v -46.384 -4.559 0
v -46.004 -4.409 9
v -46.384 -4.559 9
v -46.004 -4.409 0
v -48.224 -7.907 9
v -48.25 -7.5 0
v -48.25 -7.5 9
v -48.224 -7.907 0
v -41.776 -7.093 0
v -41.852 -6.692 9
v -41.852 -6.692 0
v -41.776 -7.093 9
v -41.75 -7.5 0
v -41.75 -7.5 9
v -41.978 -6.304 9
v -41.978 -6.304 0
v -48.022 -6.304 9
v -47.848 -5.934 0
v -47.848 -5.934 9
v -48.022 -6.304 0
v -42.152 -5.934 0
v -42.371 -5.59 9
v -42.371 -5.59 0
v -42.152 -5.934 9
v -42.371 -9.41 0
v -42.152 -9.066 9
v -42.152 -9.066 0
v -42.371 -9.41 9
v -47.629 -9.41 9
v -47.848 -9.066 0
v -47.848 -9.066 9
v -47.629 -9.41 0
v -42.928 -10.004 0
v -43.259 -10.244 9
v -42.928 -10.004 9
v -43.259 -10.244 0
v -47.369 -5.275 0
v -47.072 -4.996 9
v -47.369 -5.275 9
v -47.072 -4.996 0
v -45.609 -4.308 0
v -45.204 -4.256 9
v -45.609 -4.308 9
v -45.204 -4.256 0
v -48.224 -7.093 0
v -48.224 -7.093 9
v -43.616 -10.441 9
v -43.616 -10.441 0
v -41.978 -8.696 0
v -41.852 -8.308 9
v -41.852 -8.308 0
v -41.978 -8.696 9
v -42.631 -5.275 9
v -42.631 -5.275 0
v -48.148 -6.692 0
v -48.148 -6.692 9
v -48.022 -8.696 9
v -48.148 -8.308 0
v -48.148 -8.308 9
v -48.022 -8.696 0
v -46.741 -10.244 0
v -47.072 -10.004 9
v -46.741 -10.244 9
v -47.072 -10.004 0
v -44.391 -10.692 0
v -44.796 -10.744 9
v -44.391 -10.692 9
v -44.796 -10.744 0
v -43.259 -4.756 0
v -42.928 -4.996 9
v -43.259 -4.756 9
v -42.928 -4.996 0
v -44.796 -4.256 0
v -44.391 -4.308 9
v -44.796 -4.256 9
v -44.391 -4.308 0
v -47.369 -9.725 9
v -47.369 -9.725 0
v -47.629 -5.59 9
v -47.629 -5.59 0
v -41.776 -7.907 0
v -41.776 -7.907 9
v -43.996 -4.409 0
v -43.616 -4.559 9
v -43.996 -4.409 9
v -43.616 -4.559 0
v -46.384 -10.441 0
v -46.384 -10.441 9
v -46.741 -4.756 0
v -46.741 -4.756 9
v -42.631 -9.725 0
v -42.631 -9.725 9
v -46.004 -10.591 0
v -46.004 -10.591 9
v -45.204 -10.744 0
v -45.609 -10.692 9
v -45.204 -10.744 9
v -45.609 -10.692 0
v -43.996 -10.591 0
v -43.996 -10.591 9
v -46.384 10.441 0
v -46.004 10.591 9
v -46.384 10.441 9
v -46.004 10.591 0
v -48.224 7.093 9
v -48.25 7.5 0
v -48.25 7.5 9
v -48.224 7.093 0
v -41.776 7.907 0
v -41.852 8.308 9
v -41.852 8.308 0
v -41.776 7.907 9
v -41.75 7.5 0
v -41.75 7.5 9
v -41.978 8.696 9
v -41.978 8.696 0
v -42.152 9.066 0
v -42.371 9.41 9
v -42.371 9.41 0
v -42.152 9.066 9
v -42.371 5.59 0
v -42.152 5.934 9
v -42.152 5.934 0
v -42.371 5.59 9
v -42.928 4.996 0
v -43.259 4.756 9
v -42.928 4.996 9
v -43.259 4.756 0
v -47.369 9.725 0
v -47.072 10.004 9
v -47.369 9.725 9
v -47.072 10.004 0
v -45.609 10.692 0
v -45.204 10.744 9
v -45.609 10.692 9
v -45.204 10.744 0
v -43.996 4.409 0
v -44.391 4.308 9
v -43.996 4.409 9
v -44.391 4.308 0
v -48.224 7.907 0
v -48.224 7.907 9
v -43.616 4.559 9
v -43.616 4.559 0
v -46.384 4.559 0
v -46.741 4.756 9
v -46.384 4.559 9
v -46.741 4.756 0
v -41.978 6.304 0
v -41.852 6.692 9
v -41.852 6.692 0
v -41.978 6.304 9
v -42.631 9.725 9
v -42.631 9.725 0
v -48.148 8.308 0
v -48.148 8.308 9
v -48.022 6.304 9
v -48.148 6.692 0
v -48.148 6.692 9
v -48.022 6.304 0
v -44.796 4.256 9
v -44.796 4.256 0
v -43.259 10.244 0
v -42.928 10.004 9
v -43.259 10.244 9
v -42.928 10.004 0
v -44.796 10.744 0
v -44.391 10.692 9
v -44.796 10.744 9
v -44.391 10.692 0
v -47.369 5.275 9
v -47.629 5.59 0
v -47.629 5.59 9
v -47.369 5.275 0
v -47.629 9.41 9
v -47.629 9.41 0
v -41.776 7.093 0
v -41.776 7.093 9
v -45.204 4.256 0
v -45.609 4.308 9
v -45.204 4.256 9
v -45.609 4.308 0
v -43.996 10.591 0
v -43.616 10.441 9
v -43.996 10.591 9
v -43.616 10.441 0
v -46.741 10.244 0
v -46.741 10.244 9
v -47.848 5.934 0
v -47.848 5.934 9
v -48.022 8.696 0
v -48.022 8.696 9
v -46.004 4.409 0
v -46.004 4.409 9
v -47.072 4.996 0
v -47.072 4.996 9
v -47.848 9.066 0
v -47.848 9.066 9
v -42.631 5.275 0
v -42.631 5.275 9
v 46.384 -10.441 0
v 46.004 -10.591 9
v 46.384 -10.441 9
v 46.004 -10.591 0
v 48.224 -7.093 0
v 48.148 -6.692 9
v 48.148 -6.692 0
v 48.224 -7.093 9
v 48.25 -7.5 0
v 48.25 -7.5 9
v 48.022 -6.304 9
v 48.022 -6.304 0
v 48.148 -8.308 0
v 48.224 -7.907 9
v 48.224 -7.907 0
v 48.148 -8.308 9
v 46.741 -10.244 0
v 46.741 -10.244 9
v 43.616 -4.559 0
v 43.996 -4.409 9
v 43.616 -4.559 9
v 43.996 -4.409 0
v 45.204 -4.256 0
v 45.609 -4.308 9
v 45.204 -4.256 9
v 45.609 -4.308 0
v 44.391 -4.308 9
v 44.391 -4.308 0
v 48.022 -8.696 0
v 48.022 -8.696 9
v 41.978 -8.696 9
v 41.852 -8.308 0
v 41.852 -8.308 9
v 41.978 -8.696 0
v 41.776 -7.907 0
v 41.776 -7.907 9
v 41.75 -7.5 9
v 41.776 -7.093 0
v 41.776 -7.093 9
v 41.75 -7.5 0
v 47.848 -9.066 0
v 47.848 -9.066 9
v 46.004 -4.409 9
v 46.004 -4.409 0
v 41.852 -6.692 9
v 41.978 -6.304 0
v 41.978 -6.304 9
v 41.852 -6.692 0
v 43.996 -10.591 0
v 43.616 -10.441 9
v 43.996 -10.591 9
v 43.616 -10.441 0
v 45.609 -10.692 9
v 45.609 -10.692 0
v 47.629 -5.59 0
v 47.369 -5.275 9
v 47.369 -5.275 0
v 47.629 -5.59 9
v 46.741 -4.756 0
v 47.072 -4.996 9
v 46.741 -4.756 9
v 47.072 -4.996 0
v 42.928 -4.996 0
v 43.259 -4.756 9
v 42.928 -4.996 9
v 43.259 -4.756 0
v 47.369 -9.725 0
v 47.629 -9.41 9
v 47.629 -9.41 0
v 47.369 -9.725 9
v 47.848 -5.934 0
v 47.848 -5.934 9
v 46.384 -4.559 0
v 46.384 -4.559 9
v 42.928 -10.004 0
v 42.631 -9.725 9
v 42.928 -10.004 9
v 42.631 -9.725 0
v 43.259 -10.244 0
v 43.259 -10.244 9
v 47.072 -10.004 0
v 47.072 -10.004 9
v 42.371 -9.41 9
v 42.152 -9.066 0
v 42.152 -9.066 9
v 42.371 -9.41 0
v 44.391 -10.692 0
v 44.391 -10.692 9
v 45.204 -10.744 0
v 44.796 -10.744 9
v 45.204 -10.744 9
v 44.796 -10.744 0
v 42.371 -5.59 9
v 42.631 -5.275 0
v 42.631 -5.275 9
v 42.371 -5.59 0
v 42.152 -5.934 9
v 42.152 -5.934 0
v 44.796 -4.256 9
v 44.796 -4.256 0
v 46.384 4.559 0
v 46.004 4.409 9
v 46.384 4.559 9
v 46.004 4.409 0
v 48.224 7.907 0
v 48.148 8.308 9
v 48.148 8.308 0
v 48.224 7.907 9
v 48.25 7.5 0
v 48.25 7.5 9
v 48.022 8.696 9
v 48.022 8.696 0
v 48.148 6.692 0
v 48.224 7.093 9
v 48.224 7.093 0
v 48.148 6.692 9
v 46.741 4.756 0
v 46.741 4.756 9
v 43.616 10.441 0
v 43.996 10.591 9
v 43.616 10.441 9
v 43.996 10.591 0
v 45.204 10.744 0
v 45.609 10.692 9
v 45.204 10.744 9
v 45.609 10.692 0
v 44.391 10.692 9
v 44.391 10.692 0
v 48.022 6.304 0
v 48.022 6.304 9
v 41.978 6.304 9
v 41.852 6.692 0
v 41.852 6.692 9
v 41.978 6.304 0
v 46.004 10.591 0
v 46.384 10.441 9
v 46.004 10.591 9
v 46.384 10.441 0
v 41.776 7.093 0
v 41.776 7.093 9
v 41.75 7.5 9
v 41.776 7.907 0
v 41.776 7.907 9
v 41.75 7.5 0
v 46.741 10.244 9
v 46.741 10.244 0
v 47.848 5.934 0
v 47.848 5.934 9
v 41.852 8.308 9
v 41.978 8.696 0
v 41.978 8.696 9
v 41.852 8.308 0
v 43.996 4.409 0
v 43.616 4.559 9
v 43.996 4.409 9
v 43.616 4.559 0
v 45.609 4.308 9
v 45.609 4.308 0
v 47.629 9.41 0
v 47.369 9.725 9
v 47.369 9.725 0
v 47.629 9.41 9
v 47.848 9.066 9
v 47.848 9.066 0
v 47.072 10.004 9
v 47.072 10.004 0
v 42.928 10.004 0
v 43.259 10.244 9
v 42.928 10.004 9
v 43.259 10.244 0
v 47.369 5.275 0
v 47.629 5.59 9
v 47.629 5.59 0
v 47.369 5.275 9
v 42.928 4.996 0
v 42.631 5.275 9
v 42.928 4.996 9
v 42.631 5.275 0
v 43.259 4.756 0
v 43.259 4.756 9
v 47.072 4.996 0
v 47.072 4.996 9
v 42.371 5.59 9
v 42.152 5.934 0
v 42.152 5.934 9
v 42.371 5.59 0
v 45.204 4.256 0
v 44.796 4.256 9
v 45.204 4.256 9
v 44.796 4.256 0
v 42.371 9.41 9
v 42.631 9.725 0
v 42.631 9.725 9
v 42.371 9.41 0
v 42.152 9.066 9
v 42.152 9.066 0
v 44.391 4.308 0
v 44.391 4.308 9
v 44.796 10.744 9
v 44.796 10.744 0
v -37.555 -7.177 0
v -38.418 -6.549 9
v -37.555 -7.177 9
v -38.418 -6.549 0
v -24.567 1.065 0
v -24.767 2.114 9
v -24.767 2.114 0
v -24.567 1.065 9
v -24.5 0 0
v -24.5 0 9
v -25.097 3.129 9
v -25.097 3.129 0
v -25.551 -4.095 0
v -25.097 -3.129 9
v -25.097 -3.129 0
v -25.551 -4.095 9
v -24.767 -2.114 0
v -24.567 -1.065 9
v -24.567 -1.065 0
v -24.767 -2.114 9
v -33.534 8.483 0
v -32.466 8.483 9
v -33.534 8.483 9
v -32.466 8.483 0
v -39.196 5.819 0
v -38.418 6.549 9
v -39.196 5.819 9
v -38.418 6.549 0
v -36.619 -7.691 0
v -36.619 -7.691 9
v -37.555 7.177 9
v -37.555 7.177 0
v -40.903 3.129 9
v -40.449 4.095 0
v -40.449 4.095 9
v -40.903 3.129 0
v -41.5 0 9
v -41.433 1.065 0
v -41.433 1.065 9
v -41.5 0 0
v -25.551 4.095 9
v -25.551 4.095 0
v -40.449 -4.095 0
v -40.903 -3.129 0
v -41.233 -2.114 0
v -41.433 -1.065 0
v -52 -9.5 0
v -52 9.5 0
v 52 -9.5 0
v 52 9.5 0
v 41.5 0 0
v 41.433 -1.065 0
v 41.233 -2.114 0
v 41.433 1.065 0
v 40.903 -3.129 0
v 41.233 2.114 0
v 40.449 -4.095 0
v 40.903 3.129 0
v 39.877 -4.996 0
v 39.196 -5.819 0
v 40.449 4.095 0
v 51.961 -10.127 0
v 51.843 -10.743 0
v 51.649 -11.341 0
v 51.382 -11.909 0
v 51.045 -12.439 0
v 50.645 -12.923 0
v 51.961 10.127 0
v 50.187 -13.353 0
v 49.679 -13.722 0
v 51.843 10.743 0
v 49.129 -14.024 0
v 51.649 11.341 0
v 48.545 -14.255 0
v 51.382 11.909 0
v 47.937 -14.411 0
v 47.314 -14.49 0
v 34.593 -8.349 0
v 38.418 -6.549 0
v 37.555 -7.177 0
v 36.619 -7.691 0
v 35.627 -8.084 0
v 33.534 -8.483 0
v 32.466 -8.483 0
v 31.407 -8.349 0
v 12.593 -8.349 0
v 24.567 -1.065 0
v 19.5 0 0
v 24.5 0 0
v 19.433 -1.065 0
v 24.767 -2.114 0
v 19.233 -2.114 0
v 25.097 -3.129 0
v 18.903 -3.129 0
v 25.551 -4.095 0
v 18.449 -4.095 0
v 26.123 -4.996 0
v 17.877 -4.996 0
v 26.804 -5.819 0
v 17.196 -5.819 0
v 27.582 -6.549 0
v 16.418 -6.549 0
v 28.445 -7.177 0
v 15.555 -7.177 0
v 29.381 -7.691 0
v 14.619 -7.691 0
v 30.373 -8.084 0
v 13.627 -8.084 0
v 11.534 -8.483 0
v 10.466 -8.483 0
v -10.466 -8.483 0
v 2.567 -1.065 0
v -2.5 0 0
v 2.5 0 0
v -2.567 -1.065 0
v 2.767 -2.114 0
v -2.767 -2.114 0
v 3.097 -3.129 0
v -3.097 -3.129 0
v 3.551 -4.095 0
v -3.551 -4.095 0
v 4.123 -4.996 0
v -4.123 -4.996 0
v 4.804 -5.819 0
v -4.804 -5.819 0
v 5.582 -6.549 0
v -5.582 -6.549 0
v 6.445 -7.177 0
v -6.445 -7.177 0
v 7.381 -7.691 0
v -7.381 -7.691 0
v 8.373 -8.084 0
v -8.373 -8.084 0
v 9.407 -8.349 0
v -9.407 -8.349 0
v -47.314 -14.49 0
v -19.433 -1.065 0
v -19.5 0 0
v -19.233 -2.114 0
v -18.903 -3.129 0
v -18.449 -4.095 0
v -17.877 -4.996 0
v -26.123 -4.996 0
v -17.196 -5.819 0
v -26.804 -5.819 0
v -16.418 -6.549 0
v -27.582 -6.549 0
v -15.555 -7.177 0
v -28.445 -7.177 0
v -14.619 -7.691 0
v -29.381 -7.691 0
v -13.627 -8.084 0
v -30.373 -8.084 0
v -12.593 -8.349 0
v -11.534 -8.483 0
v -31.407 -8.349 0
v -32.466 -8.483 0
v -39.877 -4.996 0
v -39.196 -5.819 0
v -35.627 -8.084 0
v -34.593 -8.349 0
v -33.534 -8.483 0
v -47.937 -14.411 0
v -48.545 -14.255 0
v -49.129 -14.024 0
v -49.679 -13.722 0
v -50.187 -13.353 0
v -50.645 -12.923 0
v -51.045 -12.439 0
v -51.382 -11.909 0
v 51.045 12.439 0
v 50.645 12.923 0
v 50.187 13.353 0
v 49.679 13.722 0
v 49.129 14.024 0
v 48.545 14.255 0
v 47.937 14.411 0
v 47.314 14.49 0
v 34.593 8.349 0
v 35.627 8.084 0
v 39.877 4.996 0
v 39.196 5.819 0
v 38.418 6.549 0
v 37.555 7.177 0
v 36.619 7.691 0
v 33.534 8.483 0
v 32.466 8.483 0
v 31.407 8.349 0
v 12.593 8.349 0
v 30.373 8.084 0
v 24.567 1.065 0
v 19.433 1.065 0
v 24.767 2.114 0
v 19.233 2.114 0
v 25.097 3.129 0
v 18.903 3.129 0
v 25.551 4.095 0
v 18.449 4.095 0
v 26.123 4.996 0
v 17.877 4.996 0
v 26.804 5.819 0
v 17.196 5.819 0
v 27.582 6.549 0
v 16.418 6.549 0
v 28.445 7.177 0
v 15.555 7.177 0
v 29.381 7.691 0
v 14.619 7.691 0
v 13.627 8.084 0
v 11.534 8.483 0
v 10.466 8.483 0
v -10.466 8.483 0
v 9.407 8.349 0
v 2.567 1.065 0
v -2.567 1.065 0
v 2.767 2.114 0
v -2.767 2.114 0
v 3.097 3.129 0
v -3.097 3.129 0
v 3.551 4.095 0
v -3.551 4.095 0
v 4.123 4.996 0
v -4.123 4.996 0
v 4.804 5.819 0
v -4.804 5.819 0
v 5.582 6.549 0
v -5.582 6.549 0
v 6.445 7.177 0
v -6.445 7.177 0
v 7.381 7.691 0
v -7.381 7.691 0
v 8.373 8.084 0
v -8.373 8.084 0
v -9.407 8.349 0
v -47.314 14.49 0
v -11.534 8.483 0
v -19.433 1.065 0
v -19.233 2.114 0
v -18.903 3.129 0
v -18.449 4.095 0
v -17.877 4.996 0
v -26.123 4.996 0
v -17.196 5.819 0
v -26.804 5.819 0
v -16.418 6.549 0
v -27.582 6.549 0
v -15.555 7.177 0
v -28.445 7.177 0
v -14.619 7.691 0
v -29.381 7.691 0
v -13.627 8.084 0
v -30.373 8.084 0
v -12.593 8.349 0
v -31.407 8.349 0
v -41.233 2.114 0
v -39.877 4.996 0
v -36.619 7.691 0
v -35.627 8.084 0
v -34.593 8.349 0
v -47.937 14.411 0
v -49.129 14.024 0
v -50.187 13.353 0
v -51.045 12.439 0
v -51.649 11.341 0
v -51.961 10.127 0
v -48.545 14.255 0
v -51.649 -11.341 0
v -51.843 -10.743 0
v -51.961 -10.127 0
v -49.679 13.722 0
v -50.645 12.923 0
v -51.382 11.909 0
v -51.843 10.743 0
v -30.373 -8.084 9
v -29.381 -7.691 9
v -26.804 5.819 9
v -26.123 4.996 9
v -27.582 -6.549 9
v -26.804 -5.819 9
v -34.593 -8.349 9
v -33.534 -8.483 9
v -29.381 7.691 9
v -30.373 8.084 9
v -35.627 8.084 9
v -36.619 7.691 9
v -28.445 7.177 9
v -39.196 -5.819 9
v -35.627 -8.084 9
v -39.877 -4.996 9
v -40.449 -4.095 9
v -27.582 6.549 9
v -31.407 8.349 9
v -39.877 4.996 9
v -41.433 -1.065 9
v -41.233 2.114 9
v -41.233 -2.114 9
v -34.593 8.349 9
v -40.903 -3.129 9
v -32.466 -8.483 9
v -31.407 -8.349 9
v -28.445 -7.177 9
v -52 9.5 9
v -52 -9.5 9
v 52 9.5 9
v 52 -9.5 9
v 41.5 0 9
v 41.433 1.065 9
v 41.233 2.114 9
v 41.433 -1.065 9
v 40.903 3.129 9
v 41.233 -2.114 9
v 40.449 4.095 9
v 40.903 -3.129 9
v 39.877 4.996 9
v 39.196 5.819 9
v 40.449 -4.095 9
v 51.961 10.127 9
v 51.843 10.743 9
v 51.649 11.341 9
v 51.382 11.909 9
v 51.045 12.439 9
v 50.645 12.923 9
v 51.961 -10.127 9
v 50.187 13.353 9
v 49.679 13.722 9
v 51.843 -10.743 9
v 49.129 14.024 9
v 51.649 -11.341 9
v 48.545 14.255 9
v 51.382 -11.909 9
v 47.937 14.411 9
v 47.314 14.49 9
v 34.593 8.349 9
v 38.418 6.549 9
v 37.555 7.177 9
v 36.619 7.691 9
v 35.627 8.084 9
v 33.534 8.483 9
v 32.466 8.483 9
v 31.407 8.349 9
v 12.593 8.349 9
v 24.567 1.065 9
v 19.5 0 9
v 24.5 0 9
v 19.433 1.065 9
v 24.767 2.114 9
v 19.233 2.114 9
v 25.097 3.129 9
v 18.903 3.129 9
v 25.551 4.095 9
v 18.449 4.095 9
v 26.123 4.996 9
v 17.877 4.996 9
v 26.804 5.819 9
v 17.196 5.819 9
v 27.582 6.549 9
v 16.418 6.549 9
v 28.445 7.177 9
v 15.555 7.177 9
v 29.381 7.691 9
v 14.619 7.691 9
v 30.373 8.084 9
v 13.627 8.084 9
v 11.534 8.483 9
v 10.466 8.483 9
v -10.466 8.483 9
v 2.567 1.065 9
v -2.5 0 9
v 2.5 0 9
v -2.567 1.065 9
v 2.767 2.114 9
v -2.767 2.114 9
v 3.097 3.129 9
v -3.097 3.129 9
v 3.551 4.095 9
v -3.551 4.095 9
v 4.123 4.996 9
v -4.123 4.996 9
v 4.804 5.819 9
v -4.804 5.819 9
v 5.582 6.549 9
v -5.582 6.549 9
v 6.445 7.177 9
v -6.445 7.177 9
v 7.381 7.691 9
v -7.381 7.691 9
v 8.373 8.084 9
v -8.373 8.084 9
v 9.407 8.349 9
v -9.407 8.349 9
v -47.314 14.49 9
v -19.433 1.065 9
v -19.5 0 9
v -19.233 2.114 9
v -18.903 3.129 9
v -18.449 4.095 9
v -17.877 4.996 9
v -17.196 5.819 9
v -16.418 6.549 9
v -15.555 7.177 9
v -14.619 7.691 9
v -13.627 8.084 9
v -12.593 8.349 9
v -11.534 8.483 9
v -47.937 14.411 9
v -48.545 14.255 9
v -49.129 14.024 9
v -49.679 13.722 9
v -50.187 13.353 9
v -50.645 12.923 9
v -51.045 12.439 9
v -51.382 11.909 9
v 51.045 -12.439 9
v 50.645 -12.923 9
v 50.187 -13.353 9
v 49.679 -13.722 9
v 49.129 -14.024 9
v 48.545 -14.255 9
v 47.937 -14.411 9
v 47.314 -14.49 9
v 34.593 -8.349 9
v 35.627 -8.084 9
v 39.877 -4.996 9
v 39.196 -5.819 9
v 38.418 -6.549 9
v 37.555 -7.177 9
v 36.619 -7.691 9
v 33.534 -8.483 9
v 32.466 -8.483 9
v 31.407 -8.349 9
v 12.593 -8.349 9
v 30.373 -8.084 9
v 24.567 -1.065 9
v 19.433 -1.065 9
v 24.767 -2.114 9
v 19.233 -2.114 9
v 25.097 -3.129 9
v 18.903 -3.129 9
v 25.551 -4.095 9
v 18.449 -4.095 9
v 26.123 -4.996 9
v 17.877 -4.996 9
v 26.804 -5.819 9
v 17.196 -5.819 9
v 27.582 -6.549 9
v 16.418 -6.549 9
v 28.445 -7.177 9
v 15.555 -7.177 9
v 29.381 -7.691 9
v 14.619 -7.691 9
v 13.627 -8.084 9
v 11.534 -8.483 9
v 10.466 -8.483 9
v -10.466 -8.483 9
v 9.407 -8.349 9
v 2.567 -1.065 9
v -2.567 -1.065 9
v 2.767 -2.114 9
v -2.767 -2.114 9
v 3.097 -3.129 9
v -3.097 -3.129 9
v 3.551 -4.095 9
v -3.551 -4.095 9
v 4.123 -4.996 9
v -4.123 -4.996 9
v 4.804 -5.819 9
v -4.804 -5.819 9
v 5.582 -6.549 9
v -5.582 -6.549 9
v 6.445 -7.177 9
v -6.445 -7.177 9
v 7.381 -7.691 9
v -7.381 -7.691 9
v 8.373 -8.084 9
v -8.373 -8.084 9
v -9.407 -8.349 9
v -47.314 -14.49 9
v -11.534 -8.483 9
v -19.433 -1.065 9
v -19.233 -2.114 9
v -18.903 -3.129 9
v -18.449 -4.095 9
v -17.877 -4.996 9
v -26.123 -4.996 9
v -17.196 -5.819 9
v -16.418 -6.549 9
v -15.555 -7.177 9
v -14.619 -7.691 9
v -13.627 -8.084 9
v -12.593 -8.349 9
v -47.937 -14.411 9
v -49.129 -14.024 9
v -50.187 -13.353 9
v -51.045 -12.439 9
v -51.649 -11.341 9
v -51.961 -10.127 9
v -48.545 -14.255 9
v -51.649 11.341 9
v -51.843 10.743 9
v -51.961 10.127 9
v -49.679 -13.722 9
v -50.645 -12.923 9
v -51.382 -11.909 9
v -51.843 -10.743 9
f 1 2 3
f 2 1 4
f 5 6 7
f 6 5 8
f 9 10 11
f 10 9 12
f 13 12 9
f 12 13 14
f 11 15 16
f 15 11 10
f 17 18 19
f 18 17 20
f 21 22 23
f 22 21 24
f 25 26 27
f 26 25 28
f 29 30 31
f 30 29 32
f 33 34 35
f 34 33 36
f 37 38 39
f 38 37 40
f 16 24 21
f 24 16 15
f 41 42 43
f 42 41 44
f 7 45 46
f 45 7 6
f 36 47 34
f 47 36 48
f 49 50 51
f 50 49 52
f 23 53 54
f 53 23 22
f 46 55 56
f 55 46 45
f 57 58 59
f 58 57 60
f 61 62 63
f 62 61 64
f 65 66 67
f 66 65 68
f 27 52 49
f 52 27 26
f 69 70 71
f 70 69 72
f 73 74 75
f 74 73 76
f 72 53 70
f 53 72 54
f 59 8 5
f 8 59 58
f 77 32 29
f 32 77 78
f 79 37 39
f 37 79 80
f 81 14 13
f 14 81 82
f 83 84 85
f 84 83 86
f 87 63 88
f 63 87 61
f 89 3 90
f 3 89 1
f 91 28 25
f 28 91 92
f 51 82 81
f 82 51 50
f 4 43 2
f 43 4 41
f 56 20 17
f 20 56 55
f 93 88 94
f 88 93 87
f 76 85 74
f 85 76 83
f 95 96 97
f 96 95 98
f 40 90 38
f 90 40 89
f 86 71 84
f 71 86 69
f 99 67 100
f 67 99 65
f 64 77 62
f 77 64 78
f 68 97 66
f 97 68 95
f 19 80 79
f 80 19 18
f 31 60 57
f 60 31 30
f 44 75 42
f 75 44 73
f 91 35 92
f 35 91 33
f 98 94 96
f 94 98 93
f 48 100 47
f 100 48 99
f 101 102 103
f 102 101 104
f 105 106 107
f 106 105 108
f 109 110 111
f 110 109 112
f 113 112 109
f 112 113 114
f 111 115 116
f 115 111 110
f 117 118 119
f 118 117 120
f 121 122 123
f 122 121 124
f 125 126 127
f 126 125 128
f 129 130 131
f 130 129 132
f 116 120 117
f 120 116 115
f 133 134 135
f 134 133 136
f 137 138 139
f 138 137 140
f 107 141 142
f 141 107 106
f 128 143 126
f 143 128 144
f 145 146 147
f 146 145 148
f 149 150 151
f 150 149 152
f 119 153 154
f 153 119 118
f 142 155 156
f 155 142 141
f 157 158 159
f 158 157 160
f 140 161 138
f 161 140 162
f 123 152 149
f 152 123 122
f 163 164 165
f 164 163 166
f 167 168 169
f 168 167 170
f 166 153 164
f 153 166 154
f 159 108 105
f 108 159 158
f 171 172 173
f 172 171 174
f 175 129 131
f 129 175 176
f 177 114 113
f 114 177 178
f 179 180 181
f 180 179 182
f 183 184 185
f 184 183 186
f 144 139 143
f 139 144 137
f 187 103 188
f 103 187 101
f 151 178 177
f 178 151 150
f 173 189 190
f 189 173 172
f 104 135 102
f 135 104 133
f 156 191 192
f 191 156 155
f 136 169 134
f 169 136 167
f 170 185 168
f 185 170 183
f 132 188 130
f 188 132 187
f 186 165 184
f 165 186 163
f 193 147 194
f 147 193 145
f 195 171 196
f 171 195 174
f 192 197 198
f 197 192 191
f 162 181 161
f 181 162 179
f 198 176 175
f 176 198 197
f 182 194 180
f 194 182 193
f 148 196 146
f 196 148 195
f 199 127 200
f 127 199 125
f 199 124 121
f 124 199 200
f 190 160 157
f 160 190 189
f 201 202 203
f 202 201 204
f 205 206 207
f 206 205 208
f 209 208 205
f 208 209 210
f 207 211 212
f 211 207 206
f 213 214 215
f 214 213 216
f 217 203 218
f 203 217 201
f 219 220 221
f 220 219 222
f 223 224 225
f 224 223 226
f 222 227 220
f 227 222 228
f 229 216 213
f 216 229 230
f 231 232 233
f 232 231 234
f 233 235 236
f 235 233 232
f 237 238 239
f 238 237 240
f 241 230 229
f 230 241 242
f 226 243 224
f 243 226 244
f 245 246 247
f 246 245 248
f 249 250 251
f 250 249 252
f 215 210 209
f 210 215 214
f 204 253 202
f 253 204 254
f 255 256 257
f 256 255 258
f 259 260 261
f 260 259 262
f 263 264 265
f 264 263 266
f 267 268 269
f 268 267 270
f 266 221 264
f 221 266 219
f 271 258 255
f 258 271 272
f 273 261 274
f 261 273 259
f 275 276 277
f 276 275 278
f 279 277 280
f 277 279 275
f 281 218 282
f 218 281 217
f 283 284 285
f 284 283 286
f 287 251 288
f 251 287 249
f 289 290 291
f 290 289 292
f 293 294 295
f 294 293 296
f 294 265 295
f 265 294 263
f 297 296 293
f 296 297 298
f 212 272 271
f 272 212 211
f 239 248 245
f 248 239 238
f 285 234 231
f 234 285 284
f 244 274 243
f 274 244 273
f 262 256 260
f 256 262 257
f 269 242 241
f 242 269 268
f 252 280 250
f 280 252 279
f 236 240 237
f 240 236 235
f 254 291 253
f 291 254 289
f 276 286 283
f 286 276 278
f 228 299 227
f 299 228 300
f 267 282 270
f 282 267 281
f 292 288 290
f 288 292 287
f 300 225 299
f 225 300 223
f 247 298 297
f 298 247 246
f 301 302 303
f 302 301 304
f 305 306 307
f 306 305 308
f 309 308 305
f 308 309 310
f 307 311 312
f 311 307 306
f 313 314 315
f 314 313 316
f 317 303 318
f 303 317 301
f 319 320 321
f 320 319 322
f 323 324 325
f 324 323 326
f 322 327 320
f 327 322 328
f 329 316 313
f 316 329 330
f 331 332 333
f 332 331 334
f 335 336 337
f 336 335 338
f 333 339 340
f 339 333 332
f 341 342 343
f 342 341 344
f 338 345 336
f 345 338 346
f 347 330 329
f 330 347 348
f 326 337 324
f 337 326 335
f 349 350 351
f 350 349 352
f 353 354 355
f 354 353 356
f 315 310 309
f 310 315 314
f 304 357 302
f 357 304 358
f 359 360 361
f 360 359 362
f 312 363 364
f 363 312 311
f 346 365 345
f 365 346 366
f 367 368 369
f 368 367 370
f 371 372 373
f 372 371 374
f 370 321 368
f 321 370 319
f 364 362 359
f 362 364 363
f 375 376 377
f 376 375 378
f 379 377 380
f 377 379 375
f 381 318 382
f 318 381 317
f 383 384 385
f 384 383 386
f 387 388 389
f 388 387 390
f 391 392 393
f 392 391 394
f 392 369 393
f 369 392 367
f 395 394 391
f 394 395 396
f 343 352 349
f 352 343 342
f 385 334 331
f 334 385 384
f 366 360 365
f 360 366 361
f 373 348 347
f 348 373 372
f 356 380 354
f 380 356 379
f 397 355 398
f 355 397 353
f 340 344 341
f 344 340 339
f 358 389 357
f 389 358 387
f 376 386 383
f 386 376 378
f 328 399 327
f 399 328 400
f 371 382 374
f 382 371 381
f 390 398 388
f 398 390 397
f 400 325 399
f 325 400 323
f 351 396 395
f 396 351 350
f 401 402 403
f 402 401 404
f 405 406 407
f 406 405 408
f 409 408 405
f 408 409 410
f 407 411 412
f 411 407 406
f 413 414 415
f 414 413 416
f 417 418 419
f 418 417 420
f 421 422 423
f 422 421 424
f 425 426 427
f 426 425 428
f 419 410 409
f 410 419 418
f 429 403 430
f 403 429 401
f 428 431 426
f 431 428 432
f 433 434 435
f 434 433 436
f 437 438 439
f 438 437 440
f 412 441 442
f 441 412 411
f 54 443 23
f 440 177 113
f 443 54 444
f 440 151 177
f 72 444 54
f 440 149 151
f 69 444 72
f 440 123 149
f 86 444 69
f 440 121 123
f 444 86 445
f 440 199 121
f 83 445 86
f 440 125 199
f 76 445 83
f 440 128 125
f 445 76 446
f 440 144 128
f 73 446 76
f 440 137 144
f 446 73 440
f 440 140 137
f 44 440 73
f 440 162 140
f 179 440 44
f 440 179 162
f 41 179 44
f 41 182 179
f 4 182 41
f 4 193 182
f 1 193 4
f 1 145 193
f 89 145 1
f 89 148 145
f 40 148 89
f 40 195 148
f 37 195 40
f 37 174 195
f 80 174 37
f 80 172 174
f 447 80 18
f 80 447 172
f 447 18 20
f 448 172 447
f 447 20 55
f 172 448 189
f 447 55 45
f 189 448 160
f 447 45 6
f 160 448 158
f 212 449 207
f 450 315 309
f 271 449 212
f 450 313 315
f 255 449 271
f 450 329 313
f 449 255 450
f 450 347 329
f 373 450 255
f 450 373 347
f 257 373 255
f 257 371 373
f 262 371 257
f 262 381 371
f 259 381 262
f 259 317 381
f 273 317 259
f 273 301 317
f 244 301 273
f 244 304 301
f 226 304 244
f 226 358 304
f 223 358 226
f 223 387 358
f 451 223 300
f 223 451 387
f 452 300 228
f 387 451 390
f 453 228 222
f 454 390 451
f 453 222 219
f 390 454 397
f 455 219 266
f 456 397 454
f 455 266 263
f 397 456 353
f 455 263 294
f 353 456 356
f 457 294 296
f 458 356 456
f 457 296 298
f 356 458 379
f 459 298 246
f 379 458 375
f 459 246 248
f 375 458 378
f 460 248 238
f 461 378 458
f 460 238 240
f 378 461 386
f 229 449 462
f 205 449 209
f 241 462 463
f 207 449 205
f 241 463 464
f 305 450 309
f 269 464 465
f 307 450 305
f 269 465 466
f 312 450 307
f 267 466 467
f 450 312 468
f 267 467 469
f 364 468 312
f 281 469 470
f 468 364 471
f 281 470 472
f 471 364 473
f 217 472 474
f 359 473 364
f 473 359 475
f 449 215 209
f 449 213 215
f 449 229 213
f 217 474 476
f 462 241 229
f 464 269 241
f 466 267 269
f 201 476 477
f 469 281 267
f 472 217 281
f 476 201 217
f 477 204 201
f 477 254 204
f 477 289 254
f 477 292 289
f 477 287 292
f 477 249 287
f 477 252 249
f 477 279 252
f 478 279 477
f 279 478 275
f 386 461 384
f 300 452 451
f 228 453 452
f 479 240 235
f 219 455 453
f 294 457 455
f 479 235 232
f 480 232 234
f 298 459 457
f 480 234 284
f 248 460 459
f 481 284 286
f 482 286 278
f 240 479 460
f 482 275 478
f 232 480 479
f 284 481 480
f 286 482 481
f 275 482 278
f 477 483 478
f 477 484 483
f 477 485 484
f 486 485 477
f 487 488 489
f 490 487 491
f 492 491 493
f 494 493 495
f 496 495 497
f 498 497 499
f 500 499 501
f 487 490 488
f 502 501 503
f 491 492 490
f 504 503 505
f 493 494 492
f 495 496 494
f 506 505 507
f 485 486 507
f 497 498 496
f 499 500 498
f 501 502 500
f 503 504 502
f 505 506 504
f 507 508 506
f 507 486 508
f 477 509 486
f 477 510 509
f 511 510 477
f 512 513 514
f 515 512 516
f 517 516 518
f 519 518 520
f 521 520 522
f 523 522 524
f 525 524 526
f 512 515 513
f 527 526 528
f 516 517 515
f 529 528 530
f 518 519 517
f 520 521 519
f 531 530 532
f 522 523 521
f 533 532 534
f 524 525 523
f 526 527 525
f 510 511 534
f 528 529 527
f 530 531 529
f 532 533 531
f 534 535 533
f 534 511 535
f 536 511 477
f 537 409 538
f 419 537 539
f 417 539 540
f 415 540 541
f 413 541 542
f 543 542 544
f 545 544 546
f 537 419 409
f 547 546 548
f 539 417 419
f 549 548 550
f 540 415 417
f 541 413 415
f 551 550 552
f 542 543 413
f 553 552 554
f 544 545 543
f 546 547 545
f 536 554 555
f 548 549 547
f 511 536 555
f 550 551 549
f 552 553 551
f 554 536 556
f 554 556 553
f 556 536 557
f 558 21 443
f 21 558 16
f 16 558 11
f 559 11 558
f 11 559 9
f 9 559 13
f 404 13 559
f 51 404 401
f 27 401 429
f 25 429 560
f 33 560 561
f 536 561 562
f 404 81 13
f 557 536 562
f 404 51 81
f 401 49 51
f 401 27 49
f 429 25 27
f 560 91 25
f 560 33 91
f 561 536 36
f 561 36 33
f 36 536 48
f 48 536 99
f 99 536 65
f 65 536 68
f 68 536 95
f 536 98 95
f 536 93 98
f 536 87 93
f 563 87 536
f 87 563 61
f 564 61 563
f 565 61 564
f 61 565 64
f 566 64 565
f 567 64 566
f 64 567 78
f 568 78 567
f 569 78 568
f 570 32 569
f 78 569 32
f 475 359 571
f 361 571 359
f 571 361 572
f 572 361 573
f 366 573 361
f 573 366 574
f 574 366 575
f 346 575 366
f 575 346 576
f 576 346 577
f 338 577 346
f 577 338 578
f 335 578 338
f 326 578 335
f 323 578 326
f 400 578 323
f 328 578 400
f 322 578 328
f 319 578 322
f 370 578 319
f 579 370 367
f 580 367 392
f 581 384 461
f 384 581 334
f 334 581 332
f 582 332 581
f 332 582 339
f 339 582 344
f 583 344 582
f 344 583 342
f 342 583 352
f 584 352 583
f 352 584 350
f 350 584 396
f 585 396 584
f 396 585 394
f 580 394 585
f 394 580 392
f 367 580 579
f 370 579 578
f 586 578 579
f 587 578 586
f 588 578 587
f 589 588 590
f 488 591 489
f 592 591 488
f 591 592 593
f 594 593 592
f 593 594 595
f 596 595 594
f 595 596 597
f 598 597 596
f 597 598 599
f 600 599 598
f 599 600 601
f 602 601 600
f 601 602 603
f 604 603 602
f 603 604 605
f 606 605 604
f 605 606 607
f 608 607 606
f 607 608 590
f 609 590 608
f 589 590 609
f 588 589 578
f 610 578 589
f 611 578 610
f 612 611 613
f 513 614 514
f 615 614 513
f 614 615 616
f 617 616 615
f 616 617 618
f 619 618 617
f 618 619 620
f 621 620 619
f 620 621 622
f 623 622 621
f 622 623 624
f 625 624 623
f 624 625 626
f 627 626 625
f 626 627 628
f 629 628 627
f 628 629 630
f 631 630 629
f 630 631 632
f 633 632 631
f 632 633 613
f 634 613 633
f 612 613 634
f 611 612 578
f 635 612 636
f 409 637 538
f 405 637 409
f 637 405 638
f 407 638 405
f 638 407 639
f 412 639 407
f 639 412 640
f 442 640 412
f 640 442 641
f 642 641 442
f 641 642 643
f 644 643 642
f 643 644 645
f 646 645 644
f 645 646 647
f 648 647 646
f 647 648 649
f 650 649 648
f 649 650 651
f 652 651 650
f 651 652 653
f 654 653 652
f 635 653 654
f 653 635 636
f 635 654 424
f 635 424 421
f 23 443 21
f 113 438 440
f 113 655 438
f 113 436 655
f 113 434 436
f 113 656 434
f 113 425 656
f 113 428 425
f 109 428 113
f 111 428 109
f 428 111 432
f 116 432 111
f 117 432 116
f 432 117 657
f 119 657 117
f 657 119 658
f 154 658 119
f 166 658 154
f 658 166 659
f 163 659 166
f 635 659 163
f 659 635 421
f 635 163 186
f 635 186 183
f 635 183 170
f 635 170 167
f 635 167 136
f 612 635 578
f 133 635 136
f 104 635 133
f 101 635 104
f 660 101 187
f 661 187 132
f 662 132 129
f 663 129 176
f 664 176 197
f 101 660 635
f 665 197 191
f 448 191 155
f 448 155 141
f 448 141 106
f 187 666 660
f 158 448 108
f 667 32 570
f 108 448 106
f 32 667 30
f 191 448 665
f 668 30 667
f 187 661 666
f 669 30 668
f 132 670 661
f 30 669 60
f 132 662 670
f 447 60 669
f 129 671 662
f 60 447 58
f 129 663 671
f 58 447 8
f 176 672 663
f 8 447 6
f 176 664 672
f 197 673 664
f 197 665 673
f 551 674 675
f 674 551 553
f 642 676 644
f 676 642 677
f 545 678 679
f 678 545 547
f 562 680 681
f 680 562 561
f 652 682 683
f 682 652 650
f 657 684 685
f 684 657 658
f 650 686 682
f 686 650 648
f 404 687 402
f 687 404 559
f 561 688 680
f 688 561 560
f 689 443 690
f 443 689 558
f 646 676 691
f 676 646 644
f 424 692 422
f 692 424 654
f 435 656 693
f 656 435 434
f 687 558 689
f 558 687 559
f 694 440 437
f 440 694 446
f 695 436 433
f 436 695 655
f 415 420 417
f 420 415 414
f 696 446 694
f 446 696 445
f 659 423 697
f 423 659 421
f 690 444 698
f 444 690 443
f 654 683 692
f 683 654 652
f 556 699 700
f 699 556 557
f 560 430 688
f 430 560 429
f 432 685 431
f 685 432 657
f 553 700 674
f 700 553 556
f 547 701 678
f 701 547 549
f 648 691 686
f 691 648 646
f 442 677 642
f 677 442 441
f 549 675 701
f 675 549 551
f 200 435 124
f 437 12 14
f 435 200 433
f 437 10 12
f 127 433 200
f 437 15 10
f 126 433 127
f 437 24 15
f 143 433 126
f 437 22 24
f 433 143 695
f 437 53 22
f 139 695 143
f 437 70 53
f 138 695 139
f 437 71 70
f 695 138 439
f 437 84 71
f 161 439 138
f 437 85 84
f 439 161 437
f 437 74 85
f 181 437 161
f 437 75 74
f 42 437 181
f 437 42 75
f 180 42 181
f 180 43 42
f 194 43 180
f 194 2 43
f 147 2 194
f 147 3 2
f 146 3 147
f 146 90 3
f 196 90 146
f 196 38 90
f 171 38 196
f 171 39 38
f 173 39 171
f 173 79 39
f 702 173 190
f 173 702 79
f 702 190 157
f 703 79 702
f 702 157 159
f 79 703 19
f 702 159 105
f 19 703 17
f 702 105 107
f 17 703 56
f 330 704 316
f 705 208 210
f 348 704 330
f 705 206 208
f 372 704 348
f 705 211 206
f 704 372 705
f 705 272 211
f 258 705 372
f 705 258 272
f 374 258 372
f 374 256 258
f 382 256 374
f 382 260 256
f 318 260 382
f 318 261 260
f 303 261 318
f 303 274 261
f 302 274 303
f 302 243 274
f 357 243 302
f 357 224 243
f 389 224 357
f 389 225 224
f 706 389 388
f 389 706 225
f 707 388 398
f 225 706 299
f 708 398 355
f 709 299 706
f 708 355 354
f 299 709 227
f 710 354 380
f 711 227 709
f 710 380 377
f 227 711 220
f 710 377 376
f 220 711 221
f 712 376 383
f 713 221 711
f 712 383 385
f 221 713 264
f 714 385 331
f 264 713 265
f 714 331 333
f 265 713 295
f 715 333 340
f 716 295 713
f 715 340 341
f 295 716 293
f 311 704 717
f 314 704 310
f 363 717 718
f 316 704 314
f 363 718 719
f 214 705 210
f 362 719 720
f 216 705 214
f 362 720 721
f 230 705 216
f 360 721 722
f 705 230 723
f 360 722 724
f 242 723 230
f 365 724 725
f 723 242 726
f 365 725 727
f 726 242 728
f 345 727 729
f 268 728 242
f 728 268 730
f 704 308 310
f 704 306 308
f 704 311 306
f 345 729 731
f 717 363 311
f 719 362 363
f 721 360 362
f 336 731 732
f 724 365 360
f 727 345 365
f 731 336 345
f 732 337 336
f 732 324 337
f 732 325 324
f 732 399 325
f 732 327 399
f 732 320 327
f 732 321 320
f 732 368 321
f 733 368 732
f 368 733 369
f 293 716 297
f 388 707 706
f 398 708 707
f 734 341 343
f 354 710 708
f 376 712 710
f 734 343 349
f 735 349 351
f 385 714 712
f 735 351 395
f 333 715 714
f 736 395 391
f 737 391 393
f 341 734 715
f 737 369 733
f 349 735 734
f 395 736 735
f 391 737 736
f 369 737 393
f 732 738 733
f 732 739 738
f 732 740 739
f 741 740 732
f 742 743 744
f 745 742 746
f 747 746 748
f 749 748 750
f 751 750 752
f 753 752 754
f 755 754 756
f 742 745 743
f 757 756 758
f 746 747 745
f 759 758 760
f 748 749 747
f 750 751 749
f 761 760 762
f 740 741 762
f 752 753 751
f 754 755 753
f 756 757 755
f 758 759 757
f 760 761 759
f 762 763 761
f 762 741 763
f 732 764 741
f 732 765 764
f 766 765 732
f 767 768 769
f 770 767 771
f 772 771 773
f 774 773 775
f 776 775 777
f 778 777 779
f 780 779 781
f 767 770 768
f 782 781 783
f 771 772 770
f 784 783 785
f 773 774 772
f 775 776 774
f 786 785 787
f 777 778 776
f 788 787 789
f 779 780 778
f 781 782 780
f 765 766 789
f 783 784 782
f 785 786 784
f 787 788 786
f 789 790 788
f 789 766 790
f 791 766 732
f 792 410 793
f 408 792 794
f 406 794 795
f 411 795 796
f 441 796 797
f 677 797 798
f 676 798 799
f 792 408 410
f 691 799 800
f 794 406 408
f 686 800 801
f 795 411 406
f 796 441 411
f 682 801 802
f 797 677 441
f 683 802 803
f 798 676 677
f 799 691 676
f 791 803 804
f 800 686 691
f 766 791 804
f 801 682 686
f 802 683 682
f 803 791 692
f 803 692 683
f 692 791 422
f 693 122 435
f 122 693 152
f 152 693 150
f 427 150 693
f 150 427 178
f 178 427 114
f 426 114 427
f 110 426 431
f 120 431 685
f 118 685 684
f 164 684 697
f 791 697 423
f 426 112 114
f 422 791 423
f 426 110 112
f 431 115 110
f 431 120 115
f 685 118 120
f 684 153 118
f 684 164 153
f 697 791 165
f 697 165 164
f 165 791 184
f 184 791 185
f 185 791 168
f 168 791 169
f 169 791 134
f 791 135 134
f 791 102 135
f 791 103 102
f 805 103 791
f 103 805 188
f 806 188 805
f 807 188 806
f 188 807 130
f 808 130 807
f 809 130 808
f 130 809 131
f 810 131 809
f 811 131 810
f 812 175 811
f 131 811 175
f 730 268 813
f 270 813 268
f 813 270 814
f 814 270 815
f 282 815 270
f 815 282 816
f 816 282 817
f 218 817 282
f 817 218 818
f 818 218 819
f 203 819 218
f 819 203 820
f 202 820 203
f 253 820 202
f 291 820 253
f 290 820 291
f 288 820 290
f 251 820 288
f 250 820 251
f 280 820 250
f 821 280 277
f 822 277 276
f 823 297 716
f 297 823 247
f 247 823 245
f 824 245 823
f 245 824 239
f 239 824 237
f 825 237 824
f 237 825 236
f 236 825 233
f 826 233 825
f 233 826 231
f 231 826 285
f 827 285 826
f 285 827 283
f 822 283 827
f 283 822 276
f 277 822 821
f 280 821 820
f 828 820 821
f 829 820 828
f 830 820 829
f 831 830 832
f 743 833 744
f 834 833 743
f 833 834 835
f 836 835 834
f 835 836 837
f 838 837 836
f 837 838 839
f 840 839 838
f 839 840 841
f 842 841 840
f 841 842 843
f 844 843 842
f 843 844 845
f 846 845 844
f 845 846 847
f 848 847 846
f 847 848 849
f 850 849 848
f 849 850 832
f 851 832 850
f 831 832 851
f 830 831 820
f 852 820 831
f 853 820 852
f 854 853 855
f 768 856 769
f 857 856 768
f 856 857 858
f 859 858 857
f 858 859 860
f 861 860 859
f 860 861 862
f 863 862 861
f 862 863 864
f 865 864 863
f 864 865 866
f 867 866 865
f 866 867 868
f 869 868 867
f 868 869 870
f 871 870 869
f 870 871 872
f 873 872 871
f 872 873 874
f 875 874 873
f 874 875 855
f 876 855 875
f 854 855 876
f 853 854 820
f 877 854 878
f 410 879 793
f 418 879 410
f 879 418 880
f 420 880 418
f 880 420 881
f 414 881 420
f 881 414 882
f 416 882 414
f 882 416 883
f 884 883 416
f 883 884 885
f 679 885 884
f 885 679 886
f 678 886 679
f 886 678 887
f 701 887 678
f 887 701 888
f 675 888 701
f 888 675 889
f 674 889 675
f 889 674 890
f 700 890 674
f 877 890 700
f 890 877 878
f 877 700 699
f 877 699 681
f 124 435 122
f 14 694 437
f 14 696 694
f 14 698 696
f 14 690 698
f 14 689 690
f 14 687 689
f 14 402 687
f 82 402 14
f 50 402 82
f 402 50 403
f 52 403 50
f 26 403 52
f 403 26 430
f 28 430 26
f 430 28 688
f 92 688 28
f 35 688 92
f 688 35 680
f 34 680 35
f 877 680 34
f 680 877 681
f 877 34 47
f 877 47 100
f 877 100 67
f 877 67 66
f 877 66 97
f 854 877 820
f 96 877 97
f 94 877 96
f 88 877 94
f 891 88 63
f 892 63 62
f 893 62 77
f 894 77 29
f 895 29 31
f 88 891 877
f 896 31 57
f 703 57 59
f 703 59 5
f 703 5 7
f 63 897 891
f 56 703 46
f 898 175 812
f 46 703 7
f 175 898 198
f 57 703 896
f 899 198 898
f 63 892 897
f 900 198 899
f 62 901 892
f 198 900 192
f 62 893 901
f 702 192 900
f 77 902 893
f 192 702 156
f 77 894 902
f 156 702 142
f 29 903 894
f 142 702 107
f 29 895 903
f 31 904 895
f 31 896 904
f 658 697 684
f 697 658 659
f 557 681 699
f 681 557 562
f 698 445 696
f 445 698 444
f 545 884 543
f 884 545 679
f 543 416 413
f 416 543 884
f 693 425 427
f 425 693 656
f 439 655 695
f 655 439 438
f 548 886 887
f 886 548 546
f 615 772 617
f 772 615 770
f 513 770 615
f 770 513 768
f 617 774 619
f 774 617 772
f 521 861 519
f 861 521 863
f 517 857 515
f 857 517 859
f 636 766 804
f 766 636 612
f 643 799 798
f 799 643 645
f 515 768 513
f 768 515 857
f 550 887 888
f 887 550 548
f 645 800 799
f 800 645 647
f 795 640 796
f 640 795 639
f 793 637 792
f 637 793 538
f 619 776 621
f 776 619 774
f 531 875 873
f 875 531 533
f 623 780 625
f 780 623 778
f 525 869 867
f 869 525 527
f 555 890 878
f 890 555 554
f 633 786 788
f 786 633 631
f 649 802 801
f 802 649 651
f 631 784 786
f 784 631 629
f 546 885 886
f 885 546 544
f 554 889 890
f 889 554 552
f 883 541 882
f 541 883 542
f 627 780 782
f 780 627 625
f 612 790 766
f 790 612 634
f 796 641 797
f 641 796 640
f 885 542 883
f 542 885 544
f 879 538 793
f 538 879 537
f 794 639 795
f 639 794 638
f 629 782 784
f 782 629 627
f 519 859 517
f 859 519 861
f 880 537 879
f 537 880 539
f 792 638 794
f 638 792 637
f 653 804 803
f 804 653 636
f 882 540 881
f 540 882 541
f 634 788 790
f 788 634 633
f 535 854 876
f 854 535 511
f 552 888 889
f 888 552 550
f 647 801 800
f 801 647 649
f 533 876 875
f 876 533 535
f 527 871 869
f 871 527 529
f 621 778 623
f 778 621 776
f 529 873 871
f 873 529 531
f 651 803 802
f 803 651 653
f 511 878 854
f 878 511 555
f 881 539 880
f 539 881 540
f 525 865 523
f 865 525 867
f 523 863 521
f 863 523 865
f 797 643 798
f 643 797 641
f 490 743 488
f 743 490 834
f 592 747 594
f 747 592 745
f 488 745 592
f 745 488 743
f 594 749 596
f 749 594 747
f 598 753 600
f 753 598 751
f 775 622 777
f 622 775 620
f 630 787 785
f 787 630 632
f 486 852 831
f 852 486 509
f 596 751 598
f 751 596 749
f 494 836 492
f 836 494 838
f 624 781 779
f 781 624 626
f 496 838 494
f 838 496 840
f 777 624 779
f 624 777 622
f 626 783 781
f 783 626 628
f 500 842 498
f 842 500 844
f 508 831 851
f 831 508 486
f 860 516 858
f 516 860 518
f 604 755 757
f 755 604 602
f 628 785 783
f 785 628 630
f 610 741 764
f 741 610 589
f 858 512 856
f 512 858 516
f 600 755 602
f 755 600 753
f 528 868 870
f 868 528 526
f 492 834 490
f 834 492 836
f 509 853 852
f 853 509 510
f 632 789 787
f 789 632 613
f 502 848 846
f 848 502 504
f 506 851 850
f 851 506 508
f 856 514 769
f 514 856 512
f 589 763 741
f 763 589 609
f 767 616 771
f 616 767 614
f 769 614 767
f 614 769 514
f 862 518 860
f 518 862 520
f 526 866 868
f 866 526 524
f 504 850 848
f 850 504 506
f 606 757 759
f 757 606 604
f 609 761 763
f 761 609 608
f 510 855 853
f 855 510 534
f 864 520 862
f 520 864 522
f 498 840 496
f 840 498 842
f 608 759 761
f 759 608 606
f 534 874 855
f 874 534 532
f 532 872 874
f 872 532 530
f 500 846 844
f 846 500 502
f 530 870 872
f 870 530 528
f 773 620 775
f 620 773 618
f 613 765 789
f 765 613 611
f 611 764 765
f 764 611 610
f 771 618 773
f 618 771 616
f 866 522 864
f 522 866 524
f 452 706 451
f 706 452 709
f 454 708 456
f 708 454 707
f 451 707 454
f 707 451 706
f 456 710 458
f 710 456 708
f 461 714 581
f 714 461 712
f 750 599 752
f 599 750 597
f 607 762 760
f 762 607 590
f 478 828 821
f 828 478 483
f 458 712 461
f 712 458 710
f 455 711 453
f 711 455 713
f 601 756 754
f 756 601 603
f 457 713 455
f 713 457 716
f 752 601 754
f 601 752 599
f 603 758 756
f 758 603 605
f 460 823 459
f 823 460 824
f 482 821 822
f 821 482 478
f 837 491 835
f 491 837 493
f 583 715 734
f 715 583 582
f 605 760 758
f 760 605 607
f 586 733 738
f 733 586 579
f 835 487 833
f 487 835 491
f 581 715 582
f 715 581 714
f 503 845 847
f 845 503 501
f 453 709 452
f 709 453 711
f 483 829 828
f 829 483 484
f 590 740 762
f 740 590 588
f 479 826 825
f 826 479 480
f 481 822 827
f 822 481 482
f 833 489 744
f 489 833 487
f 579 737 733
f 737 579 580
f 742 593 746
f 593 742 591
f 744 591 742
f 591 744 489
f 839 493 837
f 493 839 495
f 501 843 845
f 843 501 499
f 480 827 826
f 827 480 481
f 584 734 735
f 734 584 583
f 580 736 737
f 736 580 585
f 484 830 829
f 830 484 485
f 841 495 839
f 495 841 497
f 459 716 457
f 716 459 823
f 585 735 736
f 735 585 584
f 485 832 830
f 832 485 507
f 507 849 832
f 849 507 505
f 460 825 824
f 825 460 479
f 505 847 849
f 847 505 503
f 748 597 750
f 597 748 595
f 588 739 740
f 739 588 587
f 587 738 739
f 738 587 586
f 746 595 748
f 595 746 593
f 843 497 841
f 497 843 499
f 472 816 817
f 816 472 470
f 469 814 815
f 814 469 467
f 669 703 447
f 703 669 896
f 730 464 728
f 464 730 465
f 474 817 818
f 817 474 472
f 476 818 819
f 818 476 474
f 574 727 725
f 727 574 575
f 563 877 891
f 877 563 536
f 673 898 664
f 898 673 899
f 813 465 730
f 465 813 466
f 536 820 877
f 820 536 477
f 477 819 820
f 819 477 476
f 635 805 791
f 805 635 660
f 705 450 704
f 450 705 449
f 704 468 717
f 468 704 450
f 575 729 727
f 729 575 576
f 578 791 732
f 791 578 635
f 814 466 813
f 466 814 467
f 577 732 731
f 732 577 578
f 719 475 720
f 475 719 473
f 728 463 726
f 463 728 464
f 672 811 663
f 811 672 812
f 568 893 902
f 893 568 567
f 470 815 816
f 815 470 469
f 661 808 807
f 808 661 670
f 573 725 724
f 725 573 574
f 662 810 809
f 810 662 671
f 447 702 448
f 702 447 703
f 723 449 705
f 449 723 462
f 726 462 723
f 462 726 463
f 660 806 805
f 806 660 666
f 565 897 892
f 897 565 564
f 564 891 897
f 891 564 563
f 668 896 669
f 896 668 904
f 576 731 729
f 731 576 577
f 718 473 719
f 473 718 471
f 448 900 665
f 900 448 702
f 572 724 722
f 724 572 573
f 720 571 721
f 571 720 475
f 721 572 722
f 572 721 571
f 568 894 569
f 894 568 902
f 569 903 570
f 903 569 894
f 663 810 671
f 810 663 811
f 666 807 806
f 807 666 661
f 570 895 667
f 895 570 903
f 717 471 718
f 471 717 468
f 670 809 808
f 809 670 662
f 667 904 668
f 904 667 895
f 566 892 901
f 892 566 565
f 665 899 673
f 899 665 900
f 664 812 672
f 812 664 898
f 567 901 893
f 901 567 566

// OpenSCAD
$fn = 50;


difference() {
	union() {
		hull() {
			translate(v = [-47.0000000000, 9.5000000000, 0]) {
				cylinder(h = 9, r = 5);
			}
			translate(v = [47.0000000000, 9.5000000000, 0]) {
				cylinder(h = 9, r = 5);
			}
			translate(v = [-47.0000000000, -9.5000000000, 0]) {
				cylinder(h = 9, r = 5);
			}
			translate(v = [47.0000000000, -9.5000000000, 0]) {
				cylinder(h = 9, r = 5);
			}
		}
	}
	union() {
		#translate(v = [-45.0000000000, -7.5000000000, -100.0000000000]) {
			cylinder(h = 200, r = 3.2500000000);
		}
		#translate(v = [-45.0000000000, 7.5000000000, -100.0000000000]) {
			cylinder(h = 200, r = 3.2500000000);
		}
		#translate(v = [45.0000000000, -7.5000000000, -100.0000000000]) {
			cylinder(h = 200, r = 3.2500000000);
		}
		#translate(v = [45.0000000000, 7.5000000000, -100.0000000000]) {
			cylinder(h = 200, r = 3.2500000000);
		}
		#translate(v = [-33.0000000000, 0, 0]) {
			cylinder(h = 9, r = 8.5000000000);
		}
		#translate(v = [-11.0000000000, 0, 0]) {
			cylinder(h = 9, r = 8.5000000000);
		}
		#translate(v = [11.0000000000, 0, 0]) {
			cylinder(h = 9, r = 8.5000000000);
		}
		#translate(v = [33.0000000000, 0, 0]) {
			cylinder(h = 9, r = 8.5000000000);
		}
	}
}
